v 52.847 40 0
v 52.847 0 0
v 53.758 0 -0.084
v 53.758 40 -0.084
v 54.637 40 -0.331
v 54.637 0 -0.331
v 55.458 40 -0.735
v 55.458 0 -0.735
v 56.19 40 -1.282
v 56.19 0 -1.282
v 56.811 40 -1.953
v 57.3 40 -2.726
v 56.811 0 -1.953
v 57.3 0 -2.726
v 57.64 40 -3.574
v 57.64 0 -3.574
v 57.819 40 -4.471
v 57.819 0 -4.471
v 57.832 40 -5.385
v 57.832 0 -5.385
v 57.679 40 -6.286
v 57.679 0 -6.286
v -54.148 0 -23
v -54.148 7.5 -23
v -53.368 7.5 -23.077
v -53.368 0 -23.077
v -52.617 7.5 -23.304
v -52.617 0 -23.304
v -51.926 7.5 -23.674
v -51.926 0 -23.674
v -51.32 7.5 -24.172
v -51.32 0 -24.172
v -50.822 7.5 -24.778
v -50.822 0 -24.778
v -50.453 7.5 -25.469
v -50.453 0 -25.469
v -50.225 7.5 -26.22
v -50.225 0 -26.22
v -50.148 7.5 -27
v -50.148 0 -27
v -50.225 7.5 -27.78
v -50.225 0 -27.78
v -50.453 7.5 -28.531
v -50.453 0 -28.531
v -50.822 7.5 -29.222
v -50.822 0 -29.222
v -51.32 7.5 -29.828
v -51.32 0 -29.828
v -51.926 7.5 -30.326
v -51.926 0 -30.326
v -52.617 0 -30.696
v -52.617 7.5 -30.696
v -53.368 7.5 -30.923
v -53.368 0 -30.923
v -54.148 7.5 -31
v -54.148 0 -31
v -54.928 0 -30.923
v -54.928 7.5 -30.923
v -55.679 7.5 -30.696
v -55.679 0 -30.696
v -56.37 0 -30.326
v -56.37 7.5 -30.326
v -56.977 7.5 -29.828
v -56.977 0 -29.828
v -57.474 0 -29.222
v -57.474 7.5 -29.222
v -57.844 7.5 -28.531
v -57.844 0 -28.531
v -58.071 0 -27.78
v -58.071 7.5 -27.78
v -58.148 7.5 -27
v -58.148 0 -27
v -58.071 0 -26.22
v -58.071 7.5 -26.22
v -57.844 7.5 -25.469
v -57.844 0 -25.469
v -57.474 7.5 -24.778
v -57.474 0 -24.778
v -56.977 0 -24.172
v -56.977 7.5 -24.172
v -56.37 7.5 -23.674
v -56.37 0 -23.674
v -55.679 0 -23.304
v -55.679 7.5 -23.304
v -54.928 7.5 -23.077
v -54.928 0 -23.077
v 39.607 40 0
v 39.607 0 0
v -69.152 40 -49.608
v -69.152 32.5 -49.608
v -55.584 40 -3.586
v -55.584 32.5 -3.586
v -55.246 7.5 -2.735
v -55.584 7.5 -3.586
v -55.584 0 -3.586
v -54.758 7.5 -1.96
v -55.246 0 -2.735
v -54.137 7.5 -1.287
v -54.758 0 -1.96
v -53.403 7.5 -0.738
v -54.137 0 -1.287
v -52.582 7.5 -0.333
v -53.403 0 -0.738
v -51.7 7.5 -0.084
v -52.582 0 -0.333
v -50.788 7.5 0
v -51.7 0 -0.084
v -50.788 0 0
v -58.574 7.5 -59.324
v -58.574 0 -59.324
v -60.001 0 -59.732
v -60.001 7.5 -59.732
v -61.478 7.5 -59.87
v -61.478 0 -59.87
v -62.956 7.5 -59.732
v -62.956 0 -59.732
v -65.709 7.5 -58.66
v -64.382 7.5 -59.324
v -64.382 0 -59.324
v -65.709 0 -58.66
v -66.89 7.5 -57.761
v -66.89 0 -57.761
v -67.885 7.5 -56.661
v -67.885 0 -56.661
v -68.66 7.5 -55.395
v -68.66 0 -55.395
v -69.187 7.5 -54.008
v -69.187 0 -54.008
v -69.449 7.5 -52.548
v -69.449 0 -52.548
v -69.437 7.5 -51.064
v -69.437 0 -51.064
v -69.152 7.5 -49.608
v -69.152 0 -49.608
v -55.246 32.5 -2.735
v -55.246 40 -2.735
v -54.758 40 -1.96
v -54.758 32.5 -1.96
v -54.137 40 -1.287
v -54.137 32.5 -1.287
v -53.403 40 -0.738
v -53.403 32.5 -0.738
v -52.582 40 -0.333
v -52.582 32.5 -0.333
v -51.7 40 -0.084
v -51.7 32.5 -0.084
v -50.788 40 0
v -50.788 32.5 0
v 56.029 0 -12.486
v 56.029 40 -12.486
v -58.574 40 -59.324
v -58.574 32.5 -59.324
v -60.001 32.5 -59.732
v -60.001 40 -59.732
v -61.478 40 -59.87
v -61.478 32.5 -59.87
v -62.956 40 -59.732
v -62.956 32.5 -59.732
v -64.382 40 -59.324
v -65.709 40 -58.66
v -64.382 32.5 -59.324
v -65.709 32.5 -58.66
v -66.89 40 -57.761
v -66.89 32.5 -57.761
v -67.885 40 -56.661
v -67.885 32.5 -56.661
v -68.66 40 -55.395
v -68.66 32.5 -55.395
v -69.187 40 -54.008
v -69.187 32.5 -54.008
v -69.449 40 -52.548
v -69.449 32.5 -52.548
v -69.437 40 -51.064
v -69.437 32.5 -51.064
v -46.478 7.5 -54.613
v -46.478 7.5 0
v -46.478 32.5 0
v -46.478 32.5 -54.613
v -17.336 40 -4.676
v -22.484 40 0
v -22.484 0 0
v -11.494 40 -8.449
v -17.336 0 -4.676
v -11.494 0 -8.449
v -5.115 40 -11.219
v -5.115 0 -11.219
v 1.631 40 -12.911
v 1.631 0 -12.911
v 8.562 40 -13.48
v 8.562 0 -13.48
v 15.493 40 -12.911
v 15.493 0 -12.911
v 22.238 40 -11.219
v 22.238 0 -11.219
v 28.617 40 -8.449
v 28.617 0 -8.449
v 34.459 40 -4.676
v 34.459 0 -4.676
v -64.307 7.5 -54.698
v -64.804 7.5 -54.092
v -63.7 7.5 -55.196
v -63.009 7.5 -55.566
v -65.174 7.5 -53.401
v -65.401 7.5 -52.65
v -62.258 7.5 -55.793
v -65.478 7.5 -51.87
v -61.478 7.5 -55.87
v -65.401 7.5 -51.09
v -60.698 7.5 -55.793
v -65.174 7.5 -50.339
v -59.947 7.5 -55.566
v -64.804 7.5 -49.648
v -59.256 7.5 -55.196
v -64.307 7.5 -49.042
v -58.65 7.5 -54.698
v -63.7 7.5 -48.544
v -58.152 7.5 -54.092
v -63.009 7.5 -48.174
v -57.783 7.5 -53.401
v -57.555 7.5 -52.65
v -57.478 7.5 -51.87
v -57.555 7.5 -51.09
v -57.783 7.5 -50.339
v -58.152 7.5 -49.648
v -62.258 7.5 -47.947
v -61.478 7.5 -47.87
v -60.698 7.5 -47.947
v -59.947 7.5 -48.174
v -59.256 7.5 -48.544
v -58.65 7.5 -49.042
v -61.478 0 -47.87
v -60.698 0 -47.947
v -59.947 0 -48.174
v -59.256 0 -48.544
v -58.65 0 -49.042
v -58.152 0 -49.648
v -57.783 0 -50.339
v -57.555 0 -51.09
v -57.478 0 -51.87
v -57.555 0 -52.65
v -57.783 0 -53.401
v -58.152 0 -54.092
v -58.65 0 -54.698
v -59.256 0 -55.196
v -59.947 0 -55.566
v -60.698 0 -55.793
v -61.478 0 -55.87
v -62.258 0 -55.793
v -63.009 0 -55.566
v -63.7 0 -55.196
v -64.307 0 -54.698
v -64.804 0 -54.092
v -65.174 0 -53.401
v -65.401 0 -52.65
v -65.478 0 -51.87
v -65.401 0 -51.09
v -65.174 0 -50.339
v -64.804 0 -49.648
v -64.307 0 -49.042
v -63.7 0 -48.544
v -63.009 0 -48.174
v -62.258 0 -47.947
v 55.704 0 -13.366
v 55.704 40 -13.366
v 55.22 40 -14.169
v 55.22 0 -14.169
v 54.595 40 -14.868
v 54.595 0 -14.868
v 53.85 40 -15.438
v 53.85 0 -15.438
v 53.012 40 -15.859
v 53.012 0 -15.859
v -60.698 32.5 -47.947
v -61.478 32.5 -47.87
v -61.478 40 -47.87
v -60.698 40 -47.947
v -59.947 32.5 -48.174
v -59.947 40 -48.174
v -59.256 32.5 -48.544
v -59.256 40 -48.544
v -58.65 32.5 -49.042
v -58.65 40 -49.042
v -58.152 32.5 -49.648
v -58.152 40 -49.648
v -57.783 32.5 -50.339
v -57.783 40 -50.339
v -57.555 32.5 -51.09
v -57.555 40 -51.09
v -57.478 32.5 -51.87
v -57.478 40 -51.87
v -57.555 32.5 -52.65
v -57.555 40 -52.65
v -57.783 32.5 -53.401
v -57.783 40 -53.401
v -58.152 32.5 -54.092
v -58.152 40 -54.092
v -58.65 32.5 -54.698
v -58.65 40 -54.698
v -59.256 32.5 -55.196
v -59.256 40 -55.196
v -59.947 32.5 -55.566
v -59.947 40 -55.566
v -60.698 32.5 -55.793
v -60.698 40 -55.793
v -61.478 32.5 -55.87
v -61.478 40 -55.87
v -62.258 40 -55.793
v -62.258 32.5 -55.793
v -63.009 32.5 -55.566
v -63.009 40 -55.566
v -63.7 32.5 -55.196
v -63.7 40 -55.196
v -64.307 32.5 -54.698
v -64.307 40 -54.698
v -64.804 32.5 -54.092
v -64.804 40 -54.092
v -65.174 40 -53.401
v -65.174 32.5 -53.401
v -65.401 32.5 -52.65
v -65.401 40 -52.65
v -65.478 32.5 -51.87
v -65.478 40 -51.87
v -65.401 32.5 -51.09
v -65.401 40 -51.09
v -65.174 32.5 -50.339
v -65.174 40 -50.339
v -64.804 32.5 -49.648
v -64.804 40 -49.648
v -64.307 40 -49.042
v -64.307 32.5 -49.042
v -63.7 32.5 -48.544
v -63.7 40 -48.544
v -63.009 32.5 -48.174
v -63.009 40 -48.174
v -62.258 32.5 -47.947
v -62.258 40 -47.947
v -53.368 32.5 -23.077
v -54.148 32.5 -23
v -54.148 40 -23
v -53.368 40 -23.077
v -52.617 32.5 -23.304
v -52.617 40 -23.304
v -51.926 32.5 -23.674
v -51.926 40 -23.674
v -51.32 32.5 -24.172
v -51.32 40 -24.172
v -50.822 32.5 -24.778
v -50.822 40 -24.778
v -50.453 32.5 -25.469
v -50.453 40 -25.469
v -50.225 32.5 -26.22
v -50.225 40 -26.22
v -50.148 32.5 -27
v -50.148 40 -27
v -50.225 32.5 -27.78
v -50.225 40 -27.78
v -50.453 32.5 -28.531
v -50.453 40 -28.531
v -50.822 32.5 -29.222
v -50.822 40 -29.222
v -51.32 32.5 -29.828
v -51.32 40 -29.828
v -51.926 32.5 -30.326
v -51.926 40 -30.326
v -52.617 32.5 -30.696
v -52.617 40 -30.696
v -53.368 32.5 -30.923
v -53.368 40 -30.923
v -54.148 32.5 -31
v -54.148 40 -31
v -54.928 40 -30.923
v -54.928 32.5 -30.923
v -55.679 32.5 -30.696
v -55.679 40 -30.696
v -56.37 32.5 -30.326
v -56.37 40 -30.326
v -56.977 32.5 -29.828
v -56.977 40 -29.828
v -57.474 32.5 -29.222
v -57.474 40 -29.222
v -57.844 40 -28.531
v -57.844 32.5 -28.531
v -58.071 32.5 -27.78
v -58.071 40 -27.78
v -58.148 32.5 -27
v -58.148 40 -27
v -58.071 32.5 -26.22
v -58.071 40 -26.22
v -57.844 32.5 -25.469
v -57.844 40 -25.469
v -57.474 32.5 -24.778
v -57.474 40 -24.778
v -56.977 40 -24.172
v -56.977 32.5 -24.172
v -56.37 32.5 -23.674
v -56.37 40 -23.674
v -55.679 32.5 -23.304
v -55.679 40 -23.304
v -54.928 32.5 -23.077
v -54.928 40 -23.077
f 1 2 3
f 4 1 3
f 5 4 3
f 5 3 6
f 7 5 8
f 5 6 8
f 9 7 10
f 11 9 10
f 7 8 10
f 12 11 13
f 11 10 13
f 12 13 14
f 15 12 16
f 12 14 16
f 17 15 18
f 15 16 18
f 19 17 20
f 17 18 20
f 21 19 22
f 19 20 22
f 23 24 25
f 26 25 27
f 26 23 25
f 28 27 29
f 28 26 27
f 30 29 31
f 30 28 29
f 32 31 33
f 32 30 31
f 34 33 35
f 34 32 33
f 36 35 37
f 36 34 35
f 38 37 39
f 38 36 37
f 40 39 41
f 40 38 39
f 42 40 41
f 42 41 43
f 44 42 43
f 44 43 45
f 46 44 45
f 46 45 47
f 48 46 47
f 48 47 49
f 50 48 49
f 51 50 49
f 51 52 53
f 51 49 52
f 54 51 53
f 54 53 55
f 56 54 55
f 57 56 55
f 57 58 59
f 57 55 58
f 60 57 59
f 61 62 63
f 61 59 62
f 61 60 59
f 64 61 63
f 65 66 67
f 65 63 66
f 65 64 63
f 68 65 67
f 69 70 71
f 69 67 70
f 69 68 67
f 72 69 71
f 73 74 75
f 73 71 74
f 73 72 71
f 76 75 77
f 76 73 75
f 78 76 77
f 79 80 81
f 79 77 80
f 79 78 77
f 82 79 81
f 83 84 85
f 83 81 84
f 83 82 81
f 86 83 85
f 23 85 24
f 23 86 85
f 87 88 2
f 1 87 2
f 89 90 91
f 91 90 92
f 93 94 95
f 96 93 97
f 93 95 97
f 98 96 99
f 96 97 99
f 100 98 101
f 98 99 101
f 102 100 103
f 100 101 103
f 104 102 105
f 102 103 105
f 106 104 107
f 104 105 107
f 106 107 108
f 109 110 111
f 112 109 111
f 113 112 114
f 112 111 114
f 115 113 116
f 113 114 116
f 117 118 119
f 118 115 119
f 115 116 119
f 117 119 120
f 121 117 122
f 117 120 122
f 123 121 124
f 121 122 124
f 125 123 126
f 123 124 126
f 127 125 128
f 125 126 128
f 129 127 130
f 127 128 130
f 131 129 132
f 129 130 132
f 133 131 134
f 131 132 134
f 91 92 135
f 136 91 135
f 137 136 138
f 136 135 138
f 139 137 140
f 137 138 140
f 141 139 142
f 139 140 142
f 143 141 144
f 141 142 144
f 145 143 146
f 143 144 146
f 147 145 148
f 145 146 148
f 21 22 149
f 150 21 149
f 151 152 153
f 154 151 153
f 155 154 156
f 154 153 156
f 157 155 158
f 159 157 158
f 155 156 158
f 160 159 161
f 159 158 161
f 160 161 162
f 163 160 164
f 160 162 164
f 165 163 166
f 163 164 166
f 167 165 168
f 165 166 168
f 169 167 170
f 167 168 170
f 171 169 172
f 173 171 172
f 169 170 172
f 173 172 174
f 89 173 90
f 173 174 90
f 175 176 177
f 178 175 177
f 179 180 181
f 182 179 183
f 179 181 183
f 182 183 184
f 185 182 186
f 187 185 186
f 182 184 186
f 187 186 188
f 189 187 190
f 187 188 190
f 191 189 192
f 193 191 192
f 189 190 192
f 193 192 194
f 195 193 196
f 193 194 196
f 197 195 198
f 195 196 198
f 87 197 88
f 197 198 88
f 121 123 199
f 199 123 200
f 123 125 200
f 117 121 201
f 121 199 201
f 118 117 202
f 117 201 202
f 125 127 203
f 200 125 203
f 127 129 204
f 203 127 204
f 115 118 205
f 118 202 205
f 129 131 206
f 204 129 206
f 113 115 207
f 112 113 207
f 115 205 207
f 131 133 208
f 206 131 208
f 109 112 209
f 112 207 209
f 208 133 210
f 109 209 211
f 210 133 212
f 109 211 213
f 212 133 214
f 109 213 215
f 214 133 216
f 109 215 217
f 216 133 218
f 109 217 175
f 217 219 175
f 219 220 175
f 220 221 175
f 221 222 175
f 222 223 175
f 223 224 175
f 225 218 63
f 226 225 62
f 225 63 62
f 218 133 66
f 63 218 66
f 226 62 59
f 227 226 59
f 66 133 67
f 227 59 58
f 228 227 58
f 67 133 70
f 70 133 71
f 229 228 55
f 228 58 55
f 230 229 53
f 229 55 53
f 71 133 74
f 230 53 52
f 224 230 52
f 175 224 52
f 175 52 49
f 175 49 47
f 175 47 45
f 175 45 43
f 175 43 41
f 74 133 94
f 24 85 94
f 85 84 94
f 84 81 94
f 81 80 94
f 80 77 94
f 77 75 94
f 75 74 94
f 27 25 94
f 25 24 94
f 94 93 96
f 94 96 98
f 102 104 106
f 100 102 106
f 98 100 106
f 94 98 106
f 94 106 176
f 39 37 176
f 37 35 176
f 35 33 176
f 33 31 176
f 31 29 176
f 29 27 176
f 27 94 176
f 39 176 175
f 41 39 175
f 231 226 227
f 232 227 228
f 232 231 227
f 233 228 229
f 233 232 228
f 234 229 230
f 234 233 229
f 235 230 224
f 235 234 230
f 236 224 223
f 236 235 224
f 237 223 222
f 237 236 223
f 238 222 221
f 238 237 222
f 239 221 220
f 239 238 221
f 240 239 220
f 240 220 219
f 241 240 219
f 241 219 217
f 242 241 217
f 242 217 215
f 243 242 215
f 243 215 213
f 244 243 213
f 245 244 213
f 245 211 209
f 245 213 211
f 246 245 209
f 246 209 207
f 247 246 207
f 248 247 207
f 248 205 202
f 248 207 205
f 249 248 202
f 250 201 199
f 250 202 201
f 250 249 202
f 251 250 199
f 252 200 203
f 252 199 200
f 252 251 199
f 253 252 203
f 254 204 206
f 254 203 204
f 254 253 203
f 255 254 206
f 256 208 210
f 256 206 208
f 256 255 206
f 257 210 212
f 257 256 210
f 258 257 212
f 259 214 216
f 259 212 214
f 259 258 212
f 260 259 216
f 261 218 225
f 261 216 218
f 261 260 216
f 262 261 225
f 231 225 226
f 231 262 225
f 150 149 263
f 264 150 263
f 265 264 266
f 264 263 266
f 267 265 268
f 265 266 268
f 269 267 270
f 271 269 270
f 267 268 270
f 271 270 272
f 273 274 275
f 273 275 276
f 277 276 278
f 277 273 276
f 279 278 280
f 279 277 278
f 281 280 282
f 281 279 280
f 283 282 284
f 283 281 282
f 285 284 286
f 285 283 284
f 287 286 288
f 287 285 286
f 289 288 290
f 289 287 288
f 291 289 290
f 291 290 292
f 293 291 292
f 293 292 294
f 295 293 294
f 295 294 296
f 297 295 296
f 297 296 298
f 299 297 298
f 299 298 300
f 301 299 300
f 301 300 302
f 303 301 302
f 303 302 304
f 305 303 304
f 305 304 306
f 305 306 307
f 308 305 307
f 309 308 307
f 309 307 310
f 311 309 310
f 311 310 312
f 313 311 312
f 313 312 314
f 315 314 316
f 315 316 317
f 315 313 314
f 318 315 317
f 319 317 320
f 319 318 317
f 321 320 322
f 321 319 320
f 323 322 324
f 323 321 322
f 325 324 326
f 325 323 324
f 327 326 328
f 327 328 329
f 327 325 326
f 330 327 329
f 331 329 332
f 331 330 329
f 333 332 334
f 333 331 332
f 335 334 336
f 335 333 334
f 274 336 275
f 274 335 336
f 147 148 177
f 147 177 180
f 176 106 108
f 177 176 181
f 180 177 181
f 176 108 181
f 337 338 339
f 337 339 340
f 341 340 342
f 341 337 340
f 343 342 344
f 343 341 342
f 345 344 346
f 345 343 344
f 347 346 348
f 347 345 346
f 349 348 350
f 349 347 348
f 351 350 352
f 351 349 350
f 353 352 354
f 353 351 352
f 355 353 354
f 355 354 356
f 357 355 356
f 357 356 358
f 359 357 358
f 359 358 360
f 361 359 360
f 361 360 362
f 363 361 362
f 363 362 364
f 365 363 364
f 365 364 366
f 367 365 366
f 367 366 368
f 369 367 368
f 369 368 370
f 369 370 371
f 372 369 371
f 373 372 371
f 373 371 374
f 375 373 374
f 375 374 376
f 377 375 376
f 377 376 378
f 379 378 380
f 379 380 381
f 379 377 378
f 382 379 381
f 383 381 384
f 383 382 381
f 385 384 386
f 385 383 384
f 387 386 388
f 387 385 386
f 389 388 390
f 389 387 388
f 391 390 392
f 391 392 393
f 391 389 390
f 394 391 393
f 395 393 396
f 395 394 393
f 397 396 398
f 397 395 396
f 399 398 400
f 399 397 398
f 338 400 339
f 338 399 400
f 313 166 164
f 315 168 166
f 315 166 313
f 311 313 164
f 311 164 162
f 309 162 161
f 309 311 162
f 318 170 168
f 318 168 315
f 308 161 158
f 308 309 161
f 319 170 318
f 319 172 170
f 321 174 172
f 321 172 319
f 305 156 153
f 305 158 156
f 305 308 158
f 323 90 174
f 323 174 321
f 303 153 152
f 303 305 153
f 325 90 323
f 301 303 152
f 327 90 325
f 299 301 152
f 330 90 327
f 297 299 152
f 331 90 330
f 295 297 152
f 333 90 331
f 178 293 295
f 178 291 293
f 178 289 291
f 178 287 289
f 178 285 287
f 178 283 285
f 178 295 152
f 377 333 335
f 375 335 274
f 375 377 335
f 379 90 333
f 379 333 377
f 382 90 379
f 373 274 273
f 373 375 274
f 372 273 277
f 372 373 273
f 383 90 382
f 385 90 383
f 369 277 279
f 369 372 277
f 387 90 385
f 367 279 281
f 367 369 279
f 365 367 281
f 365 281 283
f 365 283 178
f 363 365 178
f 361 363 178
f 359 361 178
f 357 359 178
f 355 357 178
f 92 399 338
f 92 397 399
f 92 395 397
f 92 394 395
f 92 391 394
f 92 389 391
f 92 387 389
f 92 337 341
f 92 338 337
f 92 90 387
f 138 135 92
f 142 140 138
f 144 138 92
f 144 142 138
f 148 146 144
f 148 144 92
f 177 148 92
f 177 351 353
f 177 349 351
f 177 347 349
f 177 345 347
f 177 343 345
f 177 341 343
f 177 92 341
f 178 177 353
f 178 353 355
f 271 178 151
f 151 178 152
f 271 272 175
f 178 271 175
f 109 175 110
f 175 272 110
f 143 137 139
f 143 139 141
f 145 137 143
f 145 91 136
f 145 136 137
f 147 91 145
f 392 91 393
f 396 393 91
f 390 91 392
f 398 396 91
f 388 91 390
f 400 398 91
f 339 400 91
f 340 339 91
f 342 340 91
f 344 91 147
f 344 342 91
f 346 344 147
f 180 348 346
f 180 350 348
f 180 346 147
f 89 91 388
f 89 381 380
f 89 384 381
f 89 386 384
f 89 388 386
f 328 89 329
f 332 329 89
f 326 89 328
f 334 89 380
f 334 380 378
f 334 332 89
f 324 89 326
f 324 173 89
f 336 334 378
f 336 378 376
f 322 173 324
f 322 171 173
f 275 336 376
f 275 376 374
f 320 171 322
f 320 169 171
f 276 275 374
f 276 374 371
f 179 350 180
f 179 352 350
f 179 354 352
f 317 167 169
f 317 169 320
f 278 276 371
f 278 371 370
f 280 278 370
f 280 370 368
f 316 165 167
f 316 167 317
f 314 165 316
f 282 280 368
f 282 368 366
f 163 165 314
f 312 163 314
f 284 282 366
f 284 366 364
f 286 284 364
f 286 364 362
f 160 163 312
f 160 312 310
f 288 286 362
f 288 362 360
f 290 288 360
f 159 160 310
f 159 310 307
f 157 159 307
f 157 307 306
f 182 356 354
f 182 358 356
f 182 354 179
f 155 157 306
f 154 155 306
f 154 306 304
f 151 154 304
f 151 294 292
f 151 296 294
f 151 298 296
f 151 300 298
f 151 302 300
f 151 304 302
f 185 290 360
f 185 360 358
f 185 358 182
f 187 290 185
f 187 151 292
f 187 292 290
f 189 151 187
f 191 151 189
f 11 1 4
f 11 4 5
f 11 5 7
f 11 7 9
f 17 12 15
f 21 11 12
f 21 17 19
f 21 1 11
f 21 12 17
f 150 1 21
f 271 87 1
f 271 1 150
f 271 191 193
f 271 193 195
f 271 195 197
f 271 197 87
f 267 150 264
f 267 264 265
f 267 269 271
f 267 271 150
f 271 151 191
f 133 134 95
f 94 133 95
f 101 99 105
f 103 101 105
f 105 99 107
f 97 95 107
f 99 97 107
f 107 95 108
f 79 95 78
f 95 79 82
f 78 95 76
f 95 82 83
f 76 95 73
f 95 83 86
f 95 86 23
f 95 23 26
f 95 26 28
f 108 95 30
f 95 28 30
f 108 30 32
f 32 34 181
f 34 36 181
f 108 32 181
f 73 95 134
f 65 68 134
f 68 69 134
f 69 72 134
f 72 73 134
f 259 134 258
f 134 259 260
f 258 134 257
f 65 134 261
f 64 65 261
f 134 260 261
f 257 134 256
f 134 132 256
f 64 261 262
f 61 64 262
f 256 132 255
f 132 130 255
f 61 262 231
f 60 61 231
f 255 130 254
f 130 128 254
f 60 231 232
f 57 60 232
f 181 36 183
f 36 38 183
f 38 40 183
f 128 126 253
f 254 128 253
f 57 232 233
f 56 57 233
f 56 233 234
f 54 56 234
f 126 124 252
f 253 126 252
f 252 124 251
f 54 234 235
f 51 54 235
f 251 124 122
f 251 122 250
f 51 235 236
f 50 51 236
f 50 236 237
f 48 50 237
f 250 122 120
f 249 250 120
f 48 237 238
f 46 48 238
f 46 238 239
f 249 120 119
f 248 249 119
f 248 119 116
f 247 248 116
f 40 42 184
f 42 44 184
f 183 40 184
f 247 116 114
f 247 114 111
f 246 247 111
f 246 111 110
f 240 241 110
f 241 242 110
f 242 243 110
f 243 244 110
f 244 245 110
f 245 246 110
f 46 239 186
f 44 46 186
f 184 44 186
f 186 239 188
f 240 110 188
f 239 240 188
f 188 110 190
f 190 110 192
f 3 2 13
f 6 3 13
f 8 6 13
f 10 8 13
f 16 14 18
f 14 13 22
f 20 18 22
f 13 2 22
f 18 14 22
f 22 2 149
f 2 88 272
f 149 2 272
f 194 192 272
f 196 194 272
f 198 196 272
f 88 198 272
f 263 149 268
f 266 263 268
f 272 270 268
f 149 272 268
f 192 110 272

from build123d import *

# Parameters (mm, degrees)
SKETCH1_R           = 4
BOSS_EXTRUDE1_DEPTH = 40
SKETCH2_W           = 23
SKETCH2_H           = 25
CUT_EXTRUDE1_DEPTH  = 101.058107917


with BuildPart() as part:
    # Sketch1 → Boss-Extrude1 (new body)
    with BuildSketch(Plane(origin=(0, 0, 0), x_dir=(1, 0, 0), z_dir=(0, 1, 0))):
        with BuildLine():
            Line((39.60733846, 0), (52.847209838, 0))
            ThreePointArc((52.847209838, 0), (56.811389388, 1.952824177), (57.67903067, 6.285887802))
            Line((57.67903067, 6.285887802), (56.02903067, 12.485887802))
            ThreePointArc((56.02903067, 12.485887802), (54.923989844, 14.533333284), (53.012004514, 15.85902568))
            Line((53.012004514, 15.85902568), (-58.57444061, 59.324441087))
            ThreePointArc((-58.57444061, 59.324441087), (-66.890236963, 57.761426345), (-69.151600504, 49.607794087))
            Line((-69.151600504, 49.607794087), (-55.584042349, 3.586121305))
            ThreePointArc((-55.584042349, 3.586121305), (-53.782323718, 0.995665256), (-50.788112092, 0))
            Line((-50.788112092, 0), (-22.483562644, 0))
            ThreePointArc((-22.483562644, 0), (8.561887908, 13.48), (39.60733846, 0))
        make_face()
        with Locations(Location((-61.478112092, 51.87, 0), (0, 0, 270))):
            Circle(SKETCH1_R, mode=Mode.SUBTRACT)
        with Locations(Location((-54.148112092, 27, 0), (0, 0, 270))):
            Circle(SKETCH1_R, mode=Mode.SUBTRACT)
    extrude(amount=BOSS_EXTRUDE1_DEPTH)

    # Sketch2 → Cut-Extrude1 (cut, through all)
    with BuildSketch(Plane.XY):
        with Locations((-57.978112092, 20)):
            Rectangle(SKETCH2_W, SKETCH2_H)
    extrude(amount=-CUT_EXTRUDE1_DEPTH, mode=Mode.SUBTRACT)


solid = part.part
